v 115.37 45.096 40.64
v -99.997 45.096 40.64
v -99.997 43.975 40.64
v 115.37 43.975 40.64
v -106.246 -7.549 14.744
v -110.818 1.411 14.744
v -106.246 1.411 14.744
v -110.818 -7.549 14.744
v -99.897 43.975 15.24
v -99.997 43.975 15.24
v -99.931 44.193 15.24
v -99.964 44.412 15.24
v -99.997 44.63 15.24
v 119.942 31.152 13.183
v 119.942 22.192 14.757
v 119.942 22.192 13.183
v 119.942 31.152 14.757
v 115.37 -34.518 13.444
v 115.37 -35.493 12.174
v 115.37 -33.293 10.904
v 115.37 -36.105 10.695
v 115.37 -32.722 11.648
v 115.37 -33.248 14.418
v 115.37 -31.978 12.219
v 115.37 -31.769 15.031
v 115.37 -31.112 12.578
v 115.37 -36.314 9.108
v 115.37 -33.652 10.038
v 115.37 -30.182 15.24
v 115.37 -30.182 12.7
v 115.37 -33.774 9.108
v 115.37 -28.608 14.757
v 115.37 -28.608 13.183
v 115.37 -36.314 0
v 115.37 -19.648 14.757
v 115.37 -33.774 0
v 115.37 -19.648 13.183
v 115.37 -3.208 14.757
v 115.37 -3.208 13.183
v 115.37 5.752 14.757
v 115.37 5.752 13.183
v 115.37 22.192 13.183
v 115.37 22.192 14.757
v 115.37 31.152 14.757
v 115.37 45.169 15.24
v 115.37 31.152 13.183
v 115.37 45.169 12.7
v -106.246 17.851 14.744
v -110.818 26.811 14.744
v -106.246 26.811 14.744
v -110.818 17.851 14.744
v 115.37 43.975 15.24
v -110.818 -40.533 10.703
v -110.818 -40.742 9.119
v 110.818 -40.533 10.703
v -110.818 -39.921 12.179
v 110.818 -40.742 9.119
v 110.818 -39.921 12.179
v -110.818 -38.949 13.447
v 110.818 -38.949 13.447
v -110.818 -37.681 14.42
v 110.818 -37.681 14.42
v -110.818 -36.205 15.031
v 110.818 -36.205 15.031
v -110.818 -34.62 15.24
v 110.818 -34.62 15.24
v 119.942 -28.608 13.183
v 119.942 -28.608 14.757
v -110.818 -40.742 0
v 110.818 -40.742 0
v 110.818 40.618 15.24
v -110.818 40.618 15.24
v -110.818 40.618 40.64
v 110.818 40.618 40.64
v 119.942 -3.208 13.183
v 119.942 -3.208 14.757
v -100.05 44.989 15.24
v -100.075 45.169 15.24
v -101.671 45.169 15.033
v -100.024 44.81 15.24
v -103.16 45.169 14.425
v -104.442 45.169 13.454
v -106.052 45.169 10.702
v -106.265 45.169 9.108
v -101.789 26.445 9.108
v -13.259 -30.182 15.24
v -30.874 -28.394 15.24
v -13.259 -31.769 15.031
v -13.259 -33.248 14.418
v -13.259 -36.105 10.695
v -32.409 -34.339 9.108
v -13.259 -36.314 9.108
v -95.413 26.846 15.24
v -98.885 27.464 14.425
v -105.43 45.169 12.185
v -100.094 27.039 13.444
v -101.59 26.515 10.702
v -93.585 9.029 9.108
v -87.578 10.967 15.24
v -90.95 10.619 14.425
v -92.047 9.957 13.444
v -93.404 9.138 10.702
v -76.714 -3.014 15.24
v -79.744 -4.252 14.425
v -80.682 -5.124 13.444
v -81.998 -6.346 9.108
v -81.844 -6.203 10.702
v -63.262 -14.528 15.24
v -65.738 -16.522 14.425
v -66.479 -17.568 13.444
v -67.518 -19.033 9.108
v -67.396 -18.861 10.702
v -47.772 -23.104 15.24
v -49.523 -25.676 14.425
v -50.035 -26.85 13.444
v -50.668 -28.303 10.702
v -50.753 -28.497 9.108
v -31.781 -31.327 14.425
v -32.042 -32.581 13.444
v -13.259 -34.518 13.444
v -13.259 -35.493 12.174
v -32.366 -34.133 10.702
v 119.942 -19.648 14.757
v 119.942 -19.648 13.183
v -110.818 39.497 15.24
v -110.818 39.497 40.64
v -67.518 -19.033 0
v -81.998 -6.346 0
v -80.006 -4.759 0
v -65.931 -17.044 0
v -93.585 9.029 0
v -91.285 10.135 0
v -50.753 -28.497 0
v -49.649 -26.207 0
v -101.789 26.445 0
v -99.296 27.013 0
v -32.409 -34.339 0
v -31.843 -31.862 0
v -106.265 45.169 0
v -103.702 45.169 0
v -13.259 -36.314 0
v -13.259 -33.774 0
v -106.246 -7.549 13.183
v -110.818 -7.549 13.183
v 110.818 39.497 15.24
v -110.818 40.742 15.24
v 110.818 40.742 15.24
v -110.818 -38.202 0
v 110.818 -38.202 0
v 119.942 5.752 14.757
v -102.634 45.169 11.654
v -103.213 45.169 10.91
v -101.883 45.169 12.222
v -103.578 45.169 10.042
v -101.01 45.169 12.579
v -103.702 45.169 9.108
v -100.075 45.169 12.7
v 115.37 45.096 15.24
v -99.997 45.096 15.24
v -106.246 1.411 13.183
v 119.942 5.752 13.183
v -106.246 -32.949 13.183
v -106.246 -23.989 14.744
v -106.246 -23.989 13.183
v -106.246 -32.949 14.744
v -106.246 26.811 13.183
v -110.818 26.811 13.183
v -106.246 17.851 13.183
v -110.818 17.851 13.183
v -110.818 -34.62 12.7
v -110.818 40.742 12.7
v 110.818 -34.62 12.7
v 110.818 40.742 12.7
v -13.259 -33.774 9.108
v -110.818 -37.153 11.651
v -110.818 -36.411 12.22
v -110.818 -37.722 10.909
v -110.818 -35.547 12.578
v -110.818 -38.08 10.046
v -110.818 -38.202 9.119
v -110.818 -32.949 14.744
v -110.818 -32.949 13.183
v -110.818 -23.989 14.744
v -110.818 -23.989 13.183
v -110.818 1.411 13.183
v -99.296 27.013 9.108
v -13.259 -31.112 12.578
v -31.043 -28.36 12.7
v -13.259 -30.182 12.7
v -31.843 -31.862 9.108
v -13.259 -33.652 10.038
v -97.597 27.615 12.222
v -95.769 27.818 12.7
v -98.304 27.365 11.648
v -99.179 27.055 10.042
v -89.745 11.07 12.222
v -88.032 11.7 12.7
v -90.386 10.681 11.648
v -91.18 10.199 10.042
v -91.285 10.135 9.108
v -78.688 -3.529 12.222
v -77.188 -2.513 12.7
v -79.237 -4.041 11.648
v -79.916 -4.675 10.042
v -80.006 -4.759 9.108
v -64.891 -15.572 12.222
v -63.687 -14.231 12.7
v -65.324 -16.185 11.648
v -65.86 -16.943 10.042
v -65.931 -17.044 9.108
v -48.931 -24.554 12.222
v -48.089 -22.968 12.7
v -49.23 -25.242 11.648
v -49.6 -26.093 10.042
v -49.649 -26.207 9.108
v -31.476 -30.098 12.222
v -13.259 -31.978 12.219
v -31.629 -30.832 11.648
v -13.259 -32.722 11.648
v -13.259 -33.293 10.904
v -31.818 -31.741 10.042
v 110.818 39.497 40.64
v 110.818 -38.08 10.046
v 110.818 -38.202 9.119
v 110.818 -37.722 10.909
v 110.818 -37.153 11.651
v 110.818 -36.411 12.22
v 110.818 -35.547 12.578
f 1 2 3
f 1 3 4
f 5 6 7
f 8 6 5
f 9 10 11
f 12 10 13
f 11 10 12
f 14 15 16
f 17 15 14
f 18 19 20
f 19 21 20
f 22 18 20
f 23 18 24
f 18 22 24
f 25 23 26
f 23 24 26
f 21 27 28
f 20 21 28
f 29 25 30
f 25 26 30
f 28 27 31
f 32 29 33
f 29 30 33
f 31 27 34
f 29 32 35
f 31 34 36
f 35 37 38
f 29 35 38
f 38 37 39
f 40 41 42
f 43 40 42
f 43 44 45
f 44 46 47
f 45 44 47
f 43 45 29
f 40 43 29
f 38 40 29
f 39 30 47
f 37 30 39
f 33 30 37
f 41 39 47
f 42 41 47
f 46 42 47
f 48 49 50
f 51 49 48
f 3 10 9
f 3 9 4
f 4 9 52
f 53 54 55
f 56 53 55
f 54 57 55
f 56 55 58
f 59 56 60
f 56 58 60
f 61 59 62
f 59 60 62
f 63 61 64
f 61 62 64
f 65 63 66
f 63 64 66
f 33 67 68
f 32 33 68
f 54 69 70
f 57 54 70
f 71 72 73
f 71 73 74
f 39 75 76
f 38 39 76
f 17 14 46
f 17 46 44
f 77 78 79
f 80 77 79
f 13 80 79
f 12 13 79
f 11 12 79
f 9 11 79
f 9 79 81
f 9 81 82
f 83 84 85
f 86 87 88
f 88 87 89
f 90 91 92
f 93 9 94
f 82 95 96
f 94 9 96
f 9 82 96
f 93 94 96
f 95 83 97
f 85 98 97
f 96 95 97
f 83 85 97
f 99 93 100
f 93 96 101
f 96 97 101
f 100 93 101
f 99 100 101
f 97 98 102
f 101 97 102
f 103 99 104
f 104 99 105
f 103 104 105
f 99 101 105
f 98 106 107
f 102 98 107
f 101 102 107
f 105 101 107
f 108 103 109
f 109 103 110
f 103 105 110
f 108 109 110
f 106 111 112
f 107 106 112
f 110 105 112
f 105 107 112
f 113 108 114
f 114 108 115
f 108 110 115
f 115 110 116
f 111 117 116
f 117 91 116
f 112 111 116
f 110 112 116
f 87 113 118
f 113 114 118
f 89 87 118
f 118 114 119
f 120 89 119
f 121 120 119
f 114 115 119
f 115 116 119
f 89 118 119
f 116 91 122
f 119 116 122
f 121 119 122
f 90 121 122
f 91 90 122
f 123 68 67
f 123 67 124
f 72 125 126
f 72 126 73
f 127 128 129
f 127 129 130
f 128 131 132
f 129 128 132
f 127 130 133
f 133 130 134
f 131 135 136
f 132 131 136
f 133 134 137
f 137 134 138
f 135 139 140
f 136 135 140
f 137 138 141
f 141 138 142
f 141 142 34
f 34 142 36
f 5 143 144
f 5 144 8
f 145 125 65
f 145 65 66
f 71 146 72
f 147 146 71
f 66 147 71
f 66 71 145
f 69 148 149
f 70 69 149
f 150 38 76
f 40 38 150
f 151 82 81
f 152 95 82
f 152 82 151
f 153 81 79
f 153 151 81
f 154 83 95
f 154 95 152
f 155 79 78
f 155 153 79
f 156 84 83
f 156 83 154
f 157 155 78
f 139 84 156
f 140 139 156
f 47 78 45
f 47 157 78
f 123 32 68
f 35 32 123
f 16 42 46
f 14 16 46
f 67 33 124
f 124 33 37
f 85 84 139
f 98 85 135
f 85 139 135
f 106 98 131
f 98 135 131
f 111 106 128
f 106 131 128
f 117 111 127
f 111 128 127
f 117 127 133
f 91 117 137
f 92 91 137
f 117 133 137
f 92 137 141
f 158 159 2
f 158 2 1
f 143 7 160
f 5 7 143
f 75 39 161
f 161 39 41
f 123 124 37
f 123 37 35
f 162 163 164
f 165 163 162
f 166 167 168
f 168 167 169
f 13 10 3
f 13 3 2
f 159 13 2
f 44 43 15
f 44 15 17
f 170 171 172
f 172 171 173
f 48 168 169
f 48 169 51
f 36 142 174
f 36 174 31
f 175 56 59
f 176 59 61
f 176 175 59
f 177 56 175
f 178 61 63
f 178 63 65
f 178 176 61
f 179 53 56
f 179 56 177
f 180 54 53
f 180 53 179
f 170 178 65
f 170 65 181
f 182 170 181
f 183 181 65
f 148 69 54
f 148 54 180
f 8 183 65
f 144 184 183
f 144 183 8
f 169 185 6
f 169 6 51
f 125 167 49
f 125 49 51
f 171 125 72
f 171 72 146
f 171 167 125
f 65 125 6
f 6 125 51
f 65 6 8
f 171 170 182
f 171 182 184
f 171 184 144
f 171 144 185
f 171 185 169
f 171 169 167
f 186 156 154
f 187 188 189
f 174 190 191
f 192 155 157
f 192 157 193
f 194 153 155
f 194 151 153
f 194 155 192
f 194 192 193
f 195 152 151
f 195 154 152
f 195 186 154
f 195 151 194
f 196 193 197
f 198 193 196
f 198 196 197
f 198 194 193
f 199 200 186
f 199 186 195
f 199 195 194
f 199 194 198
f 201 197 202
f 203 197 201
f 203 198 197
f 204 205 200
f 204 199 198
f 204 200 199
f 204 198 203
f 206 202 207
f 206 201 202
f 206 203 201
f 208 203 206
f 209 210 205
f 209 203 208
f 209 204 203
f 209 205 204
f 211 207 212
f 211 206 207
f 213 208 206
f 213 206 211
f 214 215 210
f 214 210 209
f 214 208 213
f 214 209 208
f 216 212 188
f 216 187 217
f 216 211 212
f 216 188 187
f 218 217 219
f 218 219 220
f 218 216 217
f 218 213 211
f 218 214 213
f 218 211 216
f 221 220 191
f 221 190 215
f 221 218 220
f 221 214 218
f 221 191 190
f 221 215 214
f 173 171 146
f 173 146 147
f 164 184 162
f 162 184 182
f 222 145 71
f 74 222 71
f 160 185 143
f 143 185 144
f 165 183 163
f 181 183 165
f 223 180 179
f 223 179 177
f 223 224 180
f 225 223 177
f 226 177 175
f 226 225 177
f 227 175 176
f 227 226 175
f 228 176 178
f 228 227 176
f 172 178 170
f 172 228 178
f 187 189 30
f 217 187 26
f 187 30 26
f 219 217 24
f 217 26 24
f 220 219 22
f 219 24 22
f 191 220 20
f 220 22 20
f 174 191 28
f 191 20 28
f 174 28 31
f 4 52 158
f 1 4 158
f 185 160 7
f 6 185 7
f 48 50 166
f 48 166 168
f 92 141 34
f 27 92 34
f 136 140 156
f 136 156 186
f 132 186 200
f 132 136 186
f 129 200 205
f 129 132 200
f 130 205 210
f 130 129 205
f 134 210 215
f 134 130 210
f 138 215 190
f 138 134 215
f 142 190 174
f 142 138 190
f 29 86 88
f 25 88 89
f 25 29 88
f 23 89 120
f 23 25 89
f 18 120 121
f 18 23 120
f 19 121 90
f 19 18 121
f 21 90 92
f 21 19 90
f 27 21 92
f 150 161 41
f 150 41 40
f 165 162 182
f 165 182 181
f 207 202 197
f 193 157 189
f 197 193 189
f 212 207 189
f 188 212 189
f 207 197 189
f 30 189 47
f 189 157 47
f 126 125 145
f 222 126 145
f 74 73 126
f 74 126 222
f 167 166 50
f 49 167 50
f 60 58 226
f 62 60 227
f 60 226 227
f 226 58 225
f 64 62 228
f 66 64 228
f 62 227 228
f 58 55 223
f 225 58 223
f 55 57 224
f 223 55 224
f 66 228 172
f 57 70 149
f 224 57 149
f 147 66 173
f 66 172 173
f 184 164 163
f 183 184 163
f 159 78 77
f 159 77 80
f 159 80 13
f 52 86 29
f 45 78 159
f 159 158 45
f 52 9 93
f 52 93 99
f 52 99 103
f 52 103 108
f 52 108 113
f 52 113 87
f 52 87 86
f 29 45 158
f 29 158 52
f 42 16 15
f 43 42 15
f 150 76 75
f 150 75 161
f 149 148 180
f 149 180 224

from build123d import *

# Parameters (mm, degrees)
F0_W        = 221.63532
F0_H        = 81.4832
F1_DEPTH    = 15.24
F2_T1_DEPTH = 480.2718812368
F3_R        = 6.1321024484
F4_T        = -2.54
F5_W        = 8.9602805674
F5_H        = 1.5747996354
F5_W_2      = 8.960280932
F5_H_2      = 1.5748
F6_DEPTH    = 4.572
F7_W        = 221.63532
F7_H        = 81.4832
F8_DEPTH    = 15.24
F9_R        = 6.1214
F10_T       = -2.54
F11_W       = 8.9602805674
F11_H       = 1.5609367454
F11_W_2     = 8.960280932
F11_H_2     = 1.56093711
F12_DEPTH   = 4.572
F13_W       = 215.3674113799
F13_H       = 1.1208840015
F14_DEPTH   = 25.4
F15_W       = 221.63532
F15_H       = 1.1208766
F16_DEPTH   = 25.4


# Not quite as in the source:
# - a fillet or chamfer that OpenCascade refuses, or shapes differently, is made with other operations: its cross-section is extruded or revolved along the edge and cut away or added


with BuildPart() as f1:
    # F0 (on Top) → F1 (new body)
    with BuildSketch(Plane.XY):
        with Locations((4.5526515504, 4.4273882142)):
            Rectangle(F0_W, F0_H)
    extrude(amount=F1_DEPTH)

    # F2: fillet of radius 93.8211674609 on 1 edges, made by hand

    # F2_s2 → F2_t1 (cut)
    with BuildSketch(Plane.XY.offset(-232.5159406184)):
        with BuildLine():
            ThreePointArc((-106.2650084496, 45.1689882142), (-75.0843912046, -13.0620671855), (-13.2586322022, -36.3142117858))
            Line((-13.2586322022, -36.3142117858), (-106.2650084496, -36.3142117858))
            Line((-106.2650084496, -36.3142117858), (-106.2650084496, 45.1689882142))
        make_face()
    extrude(amount=F2_T1_DEPTH, mode=Mode.SUBTRACT)

    # F3
    f3_edges = [f1.edges().sort_by_distance(p)[0] for p in [
        (51.05584, -36.314212, 15.24),
    ]]
    fillet(f3_edges, radius=F3_R)

    # F4
    f4_openings = [f1.faces().sort_by_distance(p)[0] for p in [
        (14.62211, 6.737734, 0),
        (4.817098, 45.168988, 7.604896),
        (115.370312, 4.684912, 7.579118),
    ]]
    offset(amount=F4_T, openings=f4_openings)

    # F5 (on face) → F6 (join)
    with BuildSketch(Plane.YZ.offset(115.3703115504)):
        with Locations((-24.1282563657, 13.97)):
            Rectangle(F5_W, F5_H)
        with Locations((1.2717436343, 13.97)):
            Rectangle(F5_W_2, F5_H_2)
        with Locations((26.6717436343, 13.97)):
            Rectangle(F5_W_2, F5_H_2)
    extrude(amount=F6_DEPTH)

    # F13 (on face) → F14 (join)
    with BuildSketch(Plane.XY.offset(15.24)):
        with Locations((7.6866024757, 44.5356499554)):
            Rectangle(F13_W, F13_H)
    extrude(amount=F14_DEPTH)


with BuildPart() as f8:
    # F7 (on Top) → F8 (new body)
    with BuildSketch(Plane.XY):
        Rectangle(F7_W, F7_H)
    extrude(amount=F8_DEPTH)

    # F9
    f9_edges = [f8.edges().sort_by_distance(p)[0] for p in [
        (0, -40.7416, 15.24),
    ]]
    fillet(f9_edges, radius=F9_R)

    # F10
    f10_openings = [f8.faces().sort_by_distance(p)[0] for p in [
        (0, 0, 0),
        (-110.81766, 0.256635, 7.579246),
        (110.81766, 0.256635, 7.579246),
        (0, 40.7416, 7.62),
    ]]
    offset(amount=F10_T, openings=f10_openings)

    # F11 (on face) → F12 (cut)
    with BuildSketch(Plane(origin=(-110.81766, 0, 0), x_dir=(0, -1, 0), z_dir=(-1, 0, 0))):
        with Locations((-22.3312906812, 13.9630684015)):
            Rectangle(F11_W, F11_H)
        with Locations((3.0687093188, 13.9630684015)):
            Rectangle(F11_W_2, F11_H_2)
        with Locations((28.4687093188, 13.9630684015)):
            Rectangle(F11_W_2, F11_H_2)
    extrude(amount=-F12_DEPTH, mode=Mode.SUBTRACT)

    # F15 (on face) → F16 (join)
    with BuildSketch(Plane.XY.offset(15.24)):
        with Locations((-3.3716e-06, 40.0574524351)):
            Rectangle(F15_W, F15_H)
    extrude(amount=F16_DEPTH)


solid = Compound([f1.part, f8.part])
